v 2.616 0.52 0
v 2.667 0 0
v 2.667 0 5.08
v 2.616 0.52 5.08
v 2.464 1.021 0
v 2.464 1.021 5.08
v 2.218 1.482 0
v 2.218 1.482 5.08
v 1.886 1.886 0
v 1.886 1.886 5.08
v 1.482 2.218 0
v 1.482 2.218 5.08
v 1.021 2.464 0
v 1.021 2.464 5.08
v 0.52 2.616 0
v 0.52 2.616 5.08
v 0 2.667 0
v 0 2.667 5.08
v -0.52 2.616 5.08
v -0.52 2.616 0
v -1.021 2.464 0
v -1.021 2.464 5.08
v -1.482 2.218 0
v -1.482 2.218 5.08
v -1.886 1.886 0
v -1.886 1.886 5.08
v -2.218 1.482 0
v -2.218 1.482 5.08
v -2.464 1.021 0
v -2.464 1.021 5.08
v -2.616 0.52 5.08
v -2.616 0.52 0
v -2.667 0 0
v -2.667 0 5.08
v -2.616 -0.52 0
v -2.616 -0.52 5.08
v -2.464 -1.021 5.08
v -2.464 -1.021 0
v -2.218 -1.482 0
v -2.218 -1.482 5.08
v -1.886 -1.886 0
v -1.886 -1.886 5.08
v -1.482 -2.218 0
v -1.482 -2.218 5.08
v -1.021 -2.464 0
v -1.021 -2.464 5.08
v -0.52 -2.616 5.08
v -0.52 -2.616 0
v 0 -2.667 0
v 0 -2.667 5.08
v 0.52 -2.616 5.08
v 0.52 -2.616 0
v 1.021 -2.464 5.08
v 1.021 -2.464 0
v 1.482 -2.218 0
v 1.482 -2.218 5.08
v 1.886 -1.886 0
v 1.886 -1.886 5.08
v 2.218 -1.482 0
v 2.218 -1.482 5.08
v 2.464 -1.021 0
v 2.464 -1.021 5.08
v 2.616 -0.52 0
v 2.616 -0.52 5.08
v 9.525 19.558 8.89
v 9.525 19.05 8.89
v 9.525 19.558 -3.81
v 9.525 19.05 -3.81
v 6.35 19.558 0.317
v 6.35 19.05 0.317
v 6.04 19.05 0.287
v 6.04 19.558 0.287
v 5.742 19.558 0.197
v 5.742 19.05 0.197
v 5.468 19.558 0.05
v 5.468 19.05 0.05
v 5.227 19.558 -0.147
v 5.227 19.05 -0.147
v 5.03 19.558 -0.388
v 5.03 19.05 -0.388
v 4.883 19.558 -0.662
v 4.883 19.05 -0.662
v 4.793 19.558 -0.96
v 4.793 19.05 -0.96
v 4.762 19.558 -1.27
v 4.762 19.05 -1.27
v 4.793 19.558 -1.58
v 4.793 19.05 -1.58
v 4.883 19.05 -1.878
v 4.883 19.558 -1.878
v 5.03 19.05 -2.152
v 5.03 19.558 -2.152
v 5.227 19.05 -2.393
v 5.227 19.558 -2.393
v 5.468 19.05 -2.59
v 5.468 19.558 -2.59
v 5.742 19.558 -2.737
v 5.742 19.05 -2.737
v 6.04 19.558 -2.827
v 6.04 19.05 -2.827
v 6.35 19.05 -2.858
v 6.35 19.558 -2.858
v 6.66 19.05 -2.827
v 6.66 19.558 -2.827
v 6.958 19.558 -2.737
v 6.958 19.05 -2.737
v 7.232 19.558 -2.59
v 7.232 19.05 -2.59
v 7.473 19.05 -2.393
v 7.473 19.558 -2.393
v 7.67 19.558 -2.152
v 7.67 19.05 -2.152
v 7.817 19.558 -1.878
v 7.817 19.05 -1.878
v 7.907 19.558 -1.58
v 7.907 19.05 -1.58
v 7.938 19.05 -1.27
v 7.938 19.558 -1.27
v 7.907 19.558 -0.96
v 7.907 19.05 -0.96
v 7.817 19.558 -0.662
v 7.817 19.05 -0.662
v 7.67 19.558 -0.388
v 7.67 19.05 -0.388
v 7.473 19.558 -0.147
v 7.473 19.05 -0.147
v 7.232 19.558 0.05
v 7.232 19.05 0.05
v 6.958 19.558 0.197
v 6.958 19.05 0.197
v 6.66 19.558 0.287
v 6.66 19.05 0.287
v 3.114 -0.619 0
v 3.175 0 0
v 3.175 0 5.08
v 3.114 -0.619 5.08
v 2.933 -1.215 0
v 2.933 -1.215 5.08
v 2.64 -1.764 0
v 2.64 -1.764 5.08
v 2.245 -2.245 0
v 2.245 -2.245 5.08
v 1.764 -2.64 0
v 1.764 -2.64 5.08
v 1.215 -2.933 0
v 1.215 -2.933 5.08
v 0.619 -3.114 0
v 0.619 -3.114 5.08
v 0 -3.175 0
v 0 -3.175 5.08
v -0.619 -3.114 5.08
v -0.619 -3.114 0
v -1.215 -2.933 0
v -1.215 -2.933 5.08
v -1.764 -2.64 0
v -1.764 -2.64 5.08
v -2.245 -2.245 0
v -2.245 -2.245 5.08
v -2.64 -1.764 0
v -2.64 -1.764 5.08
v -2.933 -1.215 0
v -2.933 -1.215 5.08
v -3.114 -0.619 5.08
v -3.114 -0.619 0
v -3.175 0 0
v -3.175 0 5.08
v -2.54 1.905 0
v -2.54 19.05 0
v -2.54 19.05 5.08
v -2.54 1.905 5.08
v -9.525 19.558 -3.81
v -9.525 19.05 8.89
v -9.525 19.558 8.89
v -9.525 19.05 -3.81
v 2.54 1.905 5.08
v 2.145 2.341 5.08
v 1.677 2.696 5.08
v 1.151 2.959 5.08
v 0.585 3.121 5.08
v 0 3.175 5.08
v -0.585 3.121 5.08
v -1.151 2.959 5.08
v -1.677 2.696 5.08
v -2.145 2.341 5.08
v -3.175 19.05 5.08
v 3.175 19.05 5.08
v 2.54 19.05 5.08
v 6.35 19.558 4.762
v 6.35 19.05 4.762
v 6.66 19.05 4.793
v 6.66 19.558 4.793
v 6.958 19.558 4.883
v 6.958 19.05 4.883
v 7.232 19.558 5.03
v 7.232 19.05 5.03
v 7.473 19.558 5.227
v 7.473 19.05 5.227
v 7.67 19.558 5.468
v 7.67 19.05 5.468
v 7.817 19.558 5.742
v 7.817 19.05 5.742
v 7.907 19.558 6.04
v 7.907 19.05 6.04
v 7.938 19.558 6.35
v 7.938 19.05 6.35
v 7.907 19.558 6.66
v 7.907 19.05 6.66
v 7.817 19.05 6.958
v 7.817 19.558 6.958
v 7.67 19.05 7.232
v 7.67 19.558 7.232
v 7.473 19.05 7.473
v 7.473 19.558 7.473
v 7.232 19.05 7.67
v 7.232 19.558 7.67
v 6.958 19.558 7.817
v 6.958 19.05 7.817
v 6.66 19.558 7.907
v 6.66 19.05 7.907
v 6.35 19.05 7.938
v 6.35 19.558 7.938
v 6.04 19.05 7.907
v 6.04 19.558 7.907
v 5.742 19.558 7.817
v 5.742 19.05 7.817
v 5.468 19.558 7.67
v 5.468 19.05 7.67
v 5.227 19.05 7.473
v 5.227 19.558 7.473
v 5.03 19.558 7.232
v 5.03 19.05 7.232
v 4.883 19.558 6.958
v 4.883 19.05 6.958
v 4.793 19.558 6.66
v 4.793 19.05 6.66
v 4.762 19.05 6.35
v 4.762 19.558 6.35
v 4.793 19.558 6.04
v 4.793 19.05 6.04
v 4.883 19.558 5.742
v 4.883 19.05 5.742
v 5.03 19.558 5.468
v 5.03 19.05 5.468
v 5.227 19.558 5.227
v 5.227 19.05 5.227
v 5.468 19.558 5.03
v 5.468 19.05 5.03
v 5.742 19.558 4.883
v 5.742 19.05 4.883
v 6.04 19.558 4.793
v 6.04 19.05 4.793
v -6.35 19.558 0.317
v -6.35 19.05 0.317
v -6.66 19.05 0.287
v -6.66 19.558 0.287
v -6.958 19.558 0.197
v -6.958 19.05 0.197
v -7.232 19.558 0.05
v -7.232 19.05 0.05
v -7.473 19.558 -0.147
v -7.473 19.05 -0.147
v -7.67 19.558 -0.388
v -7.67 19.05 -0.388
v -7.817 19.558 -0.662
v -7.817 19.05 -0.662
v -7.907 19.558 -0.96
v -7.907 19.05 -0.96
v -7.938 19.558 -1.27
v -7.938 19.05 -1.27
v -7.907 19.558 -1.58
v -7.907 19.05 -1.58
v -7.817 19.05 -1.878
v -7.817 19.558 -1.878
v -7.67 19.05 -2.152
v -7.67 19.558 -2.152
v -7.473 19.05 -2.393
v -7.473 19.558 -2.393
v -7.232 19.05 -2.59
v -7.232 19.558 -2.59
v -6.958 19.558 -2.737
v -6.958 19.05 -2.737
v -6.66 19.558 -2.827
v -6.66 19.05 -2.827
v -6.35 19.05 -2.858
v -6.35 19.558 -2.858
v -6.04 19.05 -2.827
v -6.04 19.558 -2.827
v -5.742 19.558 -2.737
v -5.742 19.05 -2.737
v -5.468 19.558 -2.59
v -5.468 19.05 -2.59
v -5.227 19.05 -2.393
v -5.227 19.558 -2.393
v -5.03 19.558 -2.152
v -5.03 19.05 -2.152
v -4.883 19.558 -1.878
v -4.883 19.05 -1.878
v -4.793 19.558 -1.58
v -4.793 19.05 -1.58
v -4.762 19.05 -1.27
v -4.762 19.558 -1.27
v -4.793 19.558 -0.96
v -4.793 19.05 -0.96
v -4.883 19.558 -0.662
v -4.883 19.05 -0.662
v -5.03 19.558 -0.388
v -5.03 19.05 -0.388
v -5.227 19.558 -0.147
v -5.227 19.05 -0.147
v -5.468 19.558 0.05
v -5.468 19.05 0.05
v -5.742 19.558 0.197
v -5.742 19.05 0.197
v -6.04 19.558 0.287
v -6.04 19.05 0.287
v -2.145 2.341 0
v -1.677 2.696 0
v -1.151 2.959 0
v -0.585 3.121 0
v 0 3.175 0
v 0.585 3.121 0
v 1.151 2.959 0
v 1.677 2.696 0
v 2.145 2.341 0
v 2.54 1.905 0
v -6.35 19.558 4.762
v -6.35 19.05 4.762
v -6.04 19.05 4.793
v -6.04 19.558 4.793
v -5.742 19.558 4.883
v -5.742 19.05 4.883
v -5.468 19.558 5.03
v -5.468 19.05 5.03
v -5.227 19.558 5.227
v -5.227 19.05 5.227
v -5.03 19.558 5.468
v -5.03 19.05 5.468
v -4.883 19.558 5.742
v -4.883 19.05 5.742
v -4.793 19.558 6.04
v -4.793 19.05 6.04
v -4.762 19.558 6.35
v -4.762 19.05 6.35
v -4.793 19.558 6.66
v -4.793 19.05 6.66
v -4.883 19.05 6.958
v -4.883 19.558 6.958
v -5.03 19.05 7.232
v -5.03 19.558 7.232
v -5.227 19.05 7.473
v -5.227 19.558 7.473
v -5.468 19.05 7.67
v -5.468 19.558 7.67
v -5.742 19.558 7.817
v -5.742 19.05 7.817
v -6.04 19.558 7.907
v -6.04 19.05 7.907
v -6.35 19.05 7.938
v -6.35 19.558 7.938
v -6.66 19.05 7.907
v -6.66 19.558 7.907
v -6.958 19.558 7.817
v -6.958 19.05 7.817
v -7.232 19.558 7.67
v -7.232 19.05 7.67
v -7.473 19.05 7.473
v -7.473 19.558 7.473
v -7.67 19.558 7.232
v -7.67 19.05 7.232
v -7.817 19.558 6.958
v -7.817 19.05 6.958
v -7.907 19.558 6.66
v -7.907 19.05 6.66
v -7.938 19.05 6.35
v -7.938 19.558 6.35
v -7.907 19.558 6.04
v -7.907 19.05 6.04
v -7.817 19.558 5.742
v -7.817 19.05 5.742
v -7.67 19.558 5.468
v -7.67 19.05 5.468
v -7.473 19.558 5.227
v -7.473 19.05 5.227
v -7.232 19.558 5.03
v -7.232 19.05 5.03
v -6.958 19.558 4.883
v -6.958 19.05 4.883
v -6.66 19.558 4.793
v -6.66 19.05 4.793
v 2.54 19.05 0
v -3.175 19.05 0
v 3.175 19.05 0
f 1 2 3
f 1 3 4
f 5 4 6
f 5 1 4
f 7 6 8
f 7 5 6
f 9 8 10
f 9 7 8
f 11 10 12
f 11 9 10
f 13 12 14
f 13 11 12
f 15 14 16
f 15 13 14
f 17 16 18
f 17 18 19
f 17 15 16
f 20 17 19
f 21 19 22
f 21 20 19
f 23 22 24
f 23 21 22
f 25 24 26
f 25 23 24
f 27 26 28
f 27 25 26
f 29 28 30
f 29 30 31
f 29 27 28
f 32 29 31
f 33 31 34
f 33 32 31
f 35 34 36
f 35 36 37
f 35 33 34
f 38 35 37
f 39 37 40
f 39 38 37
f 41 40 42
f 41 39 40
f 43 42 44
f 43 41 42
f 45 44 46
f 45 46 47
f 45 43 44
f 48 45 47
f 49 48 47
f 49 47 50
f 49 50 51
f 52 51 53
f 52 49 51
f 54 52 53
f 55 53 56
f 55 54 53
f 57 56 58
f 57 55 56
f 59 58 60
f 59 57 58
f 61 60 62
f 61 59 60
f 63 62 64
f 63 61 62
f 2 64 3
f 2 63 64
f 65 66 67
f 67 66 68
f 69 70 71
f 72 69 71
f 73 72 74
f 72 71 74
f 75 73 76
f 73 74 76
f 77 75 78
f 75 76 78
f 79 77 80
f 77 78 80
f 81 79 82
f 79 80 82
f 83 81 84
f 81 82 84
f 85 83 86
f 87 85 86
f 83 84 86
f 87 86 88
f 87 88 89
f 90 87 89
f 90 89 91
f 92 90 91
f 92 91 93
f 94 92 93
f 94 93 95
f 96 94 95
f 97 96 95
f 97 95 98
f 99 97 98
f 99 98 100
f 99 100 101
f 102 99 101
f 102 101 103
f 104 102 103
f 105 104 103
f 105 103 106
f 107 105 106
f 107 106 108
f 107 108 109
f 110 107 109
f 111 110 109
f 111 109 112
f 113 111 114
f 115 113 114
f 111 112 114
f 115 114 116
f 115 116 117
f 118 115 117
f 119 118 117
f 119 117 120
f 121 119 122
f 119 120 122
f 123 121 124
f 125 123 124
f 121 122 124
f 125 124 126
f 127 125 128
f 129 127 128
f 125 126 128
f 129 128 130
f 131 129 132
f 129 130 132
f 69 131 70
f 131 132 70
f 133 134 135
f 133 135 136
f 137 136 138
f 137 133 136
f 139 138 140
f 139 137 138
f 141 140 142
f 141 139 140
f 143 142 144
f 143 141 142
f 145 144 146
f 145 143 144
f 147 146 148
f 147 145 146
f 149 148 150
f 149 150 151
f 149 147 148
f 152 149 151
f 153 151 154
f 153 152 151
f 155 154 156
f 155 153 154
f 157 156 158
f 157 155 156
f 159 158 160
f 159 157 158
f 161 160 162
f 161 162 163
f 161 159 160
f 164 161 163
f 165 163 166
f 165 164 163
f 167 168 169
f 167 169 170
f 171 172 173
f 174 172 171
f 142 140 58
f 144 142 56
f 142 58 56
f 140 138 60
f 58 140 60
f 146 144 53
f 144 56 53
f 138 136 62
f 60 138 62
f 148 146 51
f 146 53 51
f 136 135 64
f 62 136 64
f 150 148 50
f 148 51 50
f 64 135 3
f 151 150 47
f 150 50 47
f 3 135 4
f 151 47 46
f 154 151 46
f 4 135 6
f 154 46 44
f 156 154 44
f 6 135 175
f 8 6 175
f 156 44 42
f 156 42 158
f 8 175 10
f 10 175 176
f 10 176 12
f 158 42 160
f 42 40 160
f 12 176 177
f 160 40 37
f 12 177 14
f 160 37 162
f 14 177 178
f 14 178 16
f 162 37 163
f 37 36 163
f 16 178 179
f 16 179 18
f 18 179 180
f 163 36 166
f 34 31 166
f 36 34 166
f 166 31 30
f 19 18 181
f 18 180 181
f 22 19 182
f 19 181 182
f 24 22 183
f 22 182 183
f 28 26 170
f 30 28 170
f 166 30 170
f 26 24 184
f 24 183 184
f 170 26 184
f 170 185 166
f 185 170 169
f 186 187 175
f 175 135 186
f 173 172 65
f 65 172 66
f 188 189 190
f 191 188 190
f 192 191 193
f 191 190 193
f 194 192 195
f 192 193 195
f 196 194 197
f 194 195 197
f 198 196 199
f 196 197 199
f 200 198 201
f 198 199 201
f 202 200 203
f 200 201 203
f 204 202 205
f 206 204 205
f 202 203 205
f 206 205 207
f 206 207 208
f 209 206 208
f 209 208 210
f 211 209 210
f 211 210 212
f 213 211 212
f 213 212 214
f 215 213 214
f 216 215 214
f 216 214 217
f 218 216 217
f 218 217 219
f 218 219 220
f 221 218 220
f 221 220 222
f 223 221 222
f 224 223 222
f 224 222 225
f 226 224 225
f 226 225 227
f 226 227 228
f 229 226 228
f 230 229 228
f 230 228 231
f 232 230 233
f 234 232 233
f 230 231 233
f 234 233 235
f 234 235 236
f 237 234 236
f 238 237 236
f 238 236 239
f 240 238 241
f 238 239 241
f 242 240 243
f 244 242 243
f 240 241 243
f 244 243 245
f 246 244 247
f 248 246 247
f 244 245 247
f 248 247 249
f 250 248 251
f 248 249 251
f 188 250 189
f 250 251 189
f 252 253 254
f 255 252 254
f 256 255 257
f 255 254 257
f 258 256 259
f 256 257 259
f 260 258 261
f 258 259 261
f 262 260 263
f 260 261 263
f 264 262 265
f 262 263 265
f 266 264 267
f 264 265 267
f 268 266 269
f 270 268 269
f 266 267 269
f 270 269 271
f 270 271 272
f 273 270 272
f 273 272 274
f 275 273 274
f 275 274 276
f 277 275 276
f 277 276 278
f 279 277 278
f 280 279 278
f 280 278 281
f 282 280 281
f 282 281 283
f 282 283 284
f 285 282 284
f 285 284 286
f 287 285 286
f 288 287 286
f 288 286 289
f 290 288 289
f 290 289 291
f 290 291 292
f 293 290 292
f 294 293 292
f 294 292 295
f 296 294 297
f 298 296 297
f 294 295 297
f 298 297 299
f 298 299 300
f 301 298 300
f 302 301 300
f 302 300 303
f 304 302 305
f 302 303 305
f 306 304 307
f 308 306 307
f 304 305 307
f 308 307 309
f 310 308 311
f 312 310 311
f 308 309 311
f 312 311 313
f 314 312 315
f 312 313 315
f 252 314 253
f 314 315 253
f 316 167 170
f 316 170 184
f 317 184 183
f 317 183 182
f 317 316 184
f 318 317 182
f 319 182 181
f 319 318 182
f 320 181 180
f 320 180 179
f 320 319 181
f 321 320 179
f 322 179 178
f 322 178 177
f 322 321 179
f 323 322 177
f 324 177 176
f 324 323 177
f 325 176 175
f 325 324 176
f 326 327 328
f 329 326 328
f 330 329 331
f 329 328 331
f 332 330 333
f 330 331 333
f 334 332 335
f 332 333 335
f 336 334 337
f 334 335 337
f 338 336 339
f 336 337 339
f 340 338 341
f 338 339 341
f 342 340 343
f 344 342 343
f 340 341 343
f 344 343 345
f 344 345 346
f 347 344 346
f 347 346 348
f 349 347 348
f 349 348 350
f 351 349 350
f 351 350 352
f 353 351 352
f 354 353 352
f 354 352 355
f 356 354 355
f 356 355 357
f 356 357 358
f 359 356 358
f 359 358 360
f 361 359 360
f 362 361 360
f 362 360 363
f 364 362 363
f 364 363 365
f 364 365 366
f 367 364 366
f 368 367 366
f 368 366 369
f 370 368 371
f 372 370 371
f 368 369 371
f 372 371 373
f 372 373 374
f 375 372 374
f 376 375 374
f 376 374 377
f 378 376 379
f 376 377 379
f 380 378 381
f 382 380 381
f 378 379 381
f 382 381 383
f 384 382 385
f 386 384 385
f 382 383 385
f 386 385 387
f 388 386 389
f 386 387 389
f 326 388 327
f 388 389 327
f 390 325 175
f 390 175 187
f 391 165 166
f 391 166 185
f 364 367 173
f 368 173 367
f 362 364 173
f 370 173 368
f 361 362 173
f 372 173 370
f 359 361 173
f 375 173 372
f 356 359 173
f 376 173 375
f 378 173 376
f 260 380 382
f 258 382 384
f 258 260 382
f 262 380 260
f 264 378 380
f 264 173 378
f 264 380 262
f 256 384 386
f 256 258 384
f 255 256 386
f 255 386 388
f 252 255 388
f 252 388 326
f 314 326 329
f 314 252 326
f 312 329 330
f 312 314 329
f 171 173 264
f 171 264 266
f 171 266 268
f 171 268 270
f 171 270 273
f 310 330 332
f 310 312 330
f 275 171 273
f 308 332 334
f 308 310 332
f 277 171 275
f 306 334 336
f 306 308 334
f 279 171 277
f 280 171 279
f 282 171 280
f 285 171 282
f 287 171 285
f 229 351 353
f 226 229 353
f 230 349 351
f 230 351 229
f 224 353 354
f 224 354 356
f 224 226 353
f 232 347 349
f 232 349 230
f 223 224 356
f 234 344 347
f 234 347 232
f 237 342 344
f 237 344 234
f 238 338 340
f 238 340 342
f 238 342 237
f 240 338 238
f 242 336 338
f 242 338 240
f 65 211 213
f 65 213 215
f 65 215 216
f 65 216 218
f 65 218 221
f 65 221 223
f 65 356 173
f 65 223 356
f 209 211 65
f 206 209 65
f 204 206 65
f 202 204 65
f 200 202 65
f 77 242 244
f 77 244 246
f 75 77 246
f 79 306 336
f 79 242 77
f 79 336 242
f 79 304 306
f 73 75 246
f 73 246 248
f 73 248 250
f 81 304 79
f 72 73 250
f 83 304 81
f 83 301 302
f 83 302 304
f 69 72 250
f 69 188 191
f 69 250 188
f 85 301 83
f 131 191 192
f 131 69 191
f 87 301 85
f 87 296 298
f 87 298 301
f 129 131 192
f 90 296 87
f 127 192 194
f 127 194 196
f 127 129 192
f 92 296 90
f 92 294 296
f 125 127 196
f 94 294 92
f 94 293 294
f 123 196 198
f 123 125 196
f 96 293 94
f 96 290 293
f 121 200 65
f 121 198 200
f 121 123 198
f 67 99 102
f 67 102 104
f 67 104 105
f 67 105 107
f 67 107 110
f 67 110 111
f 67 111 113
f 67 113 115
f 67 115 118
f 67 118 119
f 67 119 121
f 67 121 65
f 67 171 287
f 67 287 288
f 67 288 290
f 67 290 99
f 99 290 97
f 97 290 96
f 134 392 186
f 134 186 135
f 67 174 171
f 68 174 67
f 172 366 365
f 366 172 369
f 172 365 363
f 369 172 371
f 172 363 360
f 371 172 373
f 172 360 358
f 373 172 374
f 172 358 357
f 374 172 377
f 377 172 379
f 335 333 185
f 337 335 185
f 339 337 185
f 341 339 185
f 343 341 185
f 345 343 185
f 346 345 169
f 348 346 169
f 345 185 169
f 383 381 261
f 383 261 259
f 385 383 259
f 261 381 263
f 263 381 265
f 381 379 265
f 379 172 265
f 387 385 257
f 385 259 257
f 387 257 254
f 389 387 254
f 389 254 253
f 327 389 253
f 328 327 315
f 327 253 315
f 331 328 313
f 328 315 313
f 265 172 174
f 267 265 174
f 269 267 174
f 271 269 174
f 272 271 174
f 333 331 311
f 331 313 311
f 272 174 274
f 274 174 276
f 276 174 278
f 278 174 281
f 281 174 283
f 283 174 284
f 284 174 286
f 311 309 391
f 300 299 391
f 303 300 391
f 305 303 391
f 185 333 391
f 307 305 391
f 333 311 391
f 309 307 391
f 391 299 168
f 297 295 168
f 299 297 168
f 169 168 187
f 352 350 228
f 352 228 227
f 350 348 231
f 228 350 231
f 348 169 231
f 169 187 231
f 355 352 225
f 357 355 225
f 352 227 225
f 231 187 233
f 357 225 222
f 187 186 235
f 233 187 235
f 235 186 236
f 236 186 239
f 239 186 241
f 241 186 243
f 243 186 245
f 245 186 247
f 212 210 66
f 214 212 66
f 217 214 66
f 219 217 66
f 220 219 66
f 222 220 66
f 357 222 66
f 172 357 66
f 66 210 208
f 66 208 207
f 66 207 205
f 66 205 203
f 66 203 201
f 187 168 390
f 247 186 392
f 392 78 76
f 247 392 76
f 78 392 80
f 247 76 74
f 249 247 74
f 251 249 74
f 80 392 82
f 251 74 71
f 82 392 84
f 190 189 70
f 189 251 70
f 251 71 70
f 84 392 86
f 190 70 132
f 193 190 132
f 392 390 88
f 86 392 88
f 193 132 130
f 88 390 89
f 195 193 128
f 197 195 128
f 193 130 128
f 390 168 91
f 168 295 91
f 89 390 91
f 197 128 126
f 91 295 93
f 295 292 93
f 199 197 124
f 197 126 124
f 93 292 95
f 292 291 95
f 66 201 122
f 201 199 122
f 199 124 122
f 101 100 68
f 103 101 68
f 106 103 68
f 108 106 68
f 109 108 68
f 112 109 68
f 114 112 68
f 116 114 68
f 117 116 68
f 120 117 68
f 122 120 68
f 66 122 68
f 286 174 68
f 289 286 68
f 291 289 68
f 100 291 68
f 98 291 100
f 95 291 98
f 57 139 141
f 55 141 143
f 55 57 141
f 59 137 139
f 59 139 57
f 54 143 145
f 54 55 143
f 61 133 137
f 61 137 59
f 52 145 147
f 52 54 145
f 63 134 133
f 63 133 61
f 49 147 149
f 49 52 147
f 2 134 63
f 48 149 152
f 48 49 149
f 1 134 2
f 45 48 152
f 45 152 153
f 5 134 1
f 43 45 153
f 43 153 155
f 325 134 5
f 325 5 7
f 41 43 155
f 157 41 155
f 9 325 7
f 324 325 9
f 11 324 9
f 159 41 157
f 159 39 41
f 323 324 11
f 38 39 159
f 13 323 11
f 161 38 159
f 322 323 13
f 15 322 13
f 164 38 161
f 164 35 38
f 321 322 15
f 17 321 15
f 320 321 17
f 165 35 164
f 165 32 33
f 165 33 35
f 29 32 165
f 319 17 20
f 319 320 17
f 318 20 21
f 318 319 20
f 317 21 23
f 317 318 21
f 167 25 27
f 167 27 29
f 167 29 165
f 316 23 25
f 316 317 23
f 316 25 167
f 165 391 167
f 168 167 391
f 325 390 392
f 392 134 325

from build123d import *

# Parameters (mm, degrees)
SKETCH1_R           = 2.667
BOSS_EXTRUDE1_DEPTH = 5.08
SKETCH2_W           = 19.05
SKETCH2_H           = 12.7
BOSS_EXTRUDE2_DEPTH = 0.508
SKETCH4_R           = 1.5875
CUT_EXTRUDE1_DEPTH  = 26.762537724


with BuildPart() as part:
    # Sketch1 → Boss-Extrude1 (new body)
    with BuildSketch(Plane.XY):
        with BuildLine():
            Line((-3.175, 0), (-3.175, 19.05))
            Line((-3.175, 19.05), (-2.54, 19.05))
            Line((-2.54, 19.05), (-2.54, 1.905))
            ThreePointArc((-2.54, 1.905), (0, 3.175), (2.54, 1.905))
            Line((2.54, 1.905), (2.54, 19.05))
            Line((2.54, 19.05), (3.175, 19.05))
            Line((3.175, 19.05), (3.175, 0))
            ThreePointArc((3.175, 0), (0, -3.175), (-3.175, 0))
        make_face()
        Circle(SKETCH1_R, mode=Mode.SUBTRACT)
    extrude(amount=BOSS_EXTRUDE1_DEPTH)

    # Sketch2 → Boss-Extrude2 (add)
    with BuildSketch(Plane(origin=(0, 19.05, 0), x_dir=(1, 0, 0), z_dir=(0, 1, 0))):
        with Locations((0, -2.54)):
            Rectangle(SKETCH2_W, SKETCH2_H)
    extrude(amount=BOSS_EXTRUDE2_DEPTH)

    # Sketch4 → Cut-Extrude1 (cut, through all)
    with BuildSketch(Plane.XZ.offset(-19.05)):
        with Locations(Location((-6.35, 6.35, 0), (0, 0, 270))):
            Circle(SKETCH4_R)
        with Locations(Location((6.35, 6.35, 0), (0, 0, 270))):
            Circle(SKETCH4_R)
        with Locations(Location((6.35, -1.27, 0), (0, 0, 90))):
            Circle(SKETCH4_R)
        with Locations(Location((-6.35, -1.27, 0), (0, 0, 90))):
            Circle(SKETCH4_R)
    extrude(amount=-CUT_EXTRUDE1_DEPTH, mode=Mode.SUBTRACT)


solid = part.part
